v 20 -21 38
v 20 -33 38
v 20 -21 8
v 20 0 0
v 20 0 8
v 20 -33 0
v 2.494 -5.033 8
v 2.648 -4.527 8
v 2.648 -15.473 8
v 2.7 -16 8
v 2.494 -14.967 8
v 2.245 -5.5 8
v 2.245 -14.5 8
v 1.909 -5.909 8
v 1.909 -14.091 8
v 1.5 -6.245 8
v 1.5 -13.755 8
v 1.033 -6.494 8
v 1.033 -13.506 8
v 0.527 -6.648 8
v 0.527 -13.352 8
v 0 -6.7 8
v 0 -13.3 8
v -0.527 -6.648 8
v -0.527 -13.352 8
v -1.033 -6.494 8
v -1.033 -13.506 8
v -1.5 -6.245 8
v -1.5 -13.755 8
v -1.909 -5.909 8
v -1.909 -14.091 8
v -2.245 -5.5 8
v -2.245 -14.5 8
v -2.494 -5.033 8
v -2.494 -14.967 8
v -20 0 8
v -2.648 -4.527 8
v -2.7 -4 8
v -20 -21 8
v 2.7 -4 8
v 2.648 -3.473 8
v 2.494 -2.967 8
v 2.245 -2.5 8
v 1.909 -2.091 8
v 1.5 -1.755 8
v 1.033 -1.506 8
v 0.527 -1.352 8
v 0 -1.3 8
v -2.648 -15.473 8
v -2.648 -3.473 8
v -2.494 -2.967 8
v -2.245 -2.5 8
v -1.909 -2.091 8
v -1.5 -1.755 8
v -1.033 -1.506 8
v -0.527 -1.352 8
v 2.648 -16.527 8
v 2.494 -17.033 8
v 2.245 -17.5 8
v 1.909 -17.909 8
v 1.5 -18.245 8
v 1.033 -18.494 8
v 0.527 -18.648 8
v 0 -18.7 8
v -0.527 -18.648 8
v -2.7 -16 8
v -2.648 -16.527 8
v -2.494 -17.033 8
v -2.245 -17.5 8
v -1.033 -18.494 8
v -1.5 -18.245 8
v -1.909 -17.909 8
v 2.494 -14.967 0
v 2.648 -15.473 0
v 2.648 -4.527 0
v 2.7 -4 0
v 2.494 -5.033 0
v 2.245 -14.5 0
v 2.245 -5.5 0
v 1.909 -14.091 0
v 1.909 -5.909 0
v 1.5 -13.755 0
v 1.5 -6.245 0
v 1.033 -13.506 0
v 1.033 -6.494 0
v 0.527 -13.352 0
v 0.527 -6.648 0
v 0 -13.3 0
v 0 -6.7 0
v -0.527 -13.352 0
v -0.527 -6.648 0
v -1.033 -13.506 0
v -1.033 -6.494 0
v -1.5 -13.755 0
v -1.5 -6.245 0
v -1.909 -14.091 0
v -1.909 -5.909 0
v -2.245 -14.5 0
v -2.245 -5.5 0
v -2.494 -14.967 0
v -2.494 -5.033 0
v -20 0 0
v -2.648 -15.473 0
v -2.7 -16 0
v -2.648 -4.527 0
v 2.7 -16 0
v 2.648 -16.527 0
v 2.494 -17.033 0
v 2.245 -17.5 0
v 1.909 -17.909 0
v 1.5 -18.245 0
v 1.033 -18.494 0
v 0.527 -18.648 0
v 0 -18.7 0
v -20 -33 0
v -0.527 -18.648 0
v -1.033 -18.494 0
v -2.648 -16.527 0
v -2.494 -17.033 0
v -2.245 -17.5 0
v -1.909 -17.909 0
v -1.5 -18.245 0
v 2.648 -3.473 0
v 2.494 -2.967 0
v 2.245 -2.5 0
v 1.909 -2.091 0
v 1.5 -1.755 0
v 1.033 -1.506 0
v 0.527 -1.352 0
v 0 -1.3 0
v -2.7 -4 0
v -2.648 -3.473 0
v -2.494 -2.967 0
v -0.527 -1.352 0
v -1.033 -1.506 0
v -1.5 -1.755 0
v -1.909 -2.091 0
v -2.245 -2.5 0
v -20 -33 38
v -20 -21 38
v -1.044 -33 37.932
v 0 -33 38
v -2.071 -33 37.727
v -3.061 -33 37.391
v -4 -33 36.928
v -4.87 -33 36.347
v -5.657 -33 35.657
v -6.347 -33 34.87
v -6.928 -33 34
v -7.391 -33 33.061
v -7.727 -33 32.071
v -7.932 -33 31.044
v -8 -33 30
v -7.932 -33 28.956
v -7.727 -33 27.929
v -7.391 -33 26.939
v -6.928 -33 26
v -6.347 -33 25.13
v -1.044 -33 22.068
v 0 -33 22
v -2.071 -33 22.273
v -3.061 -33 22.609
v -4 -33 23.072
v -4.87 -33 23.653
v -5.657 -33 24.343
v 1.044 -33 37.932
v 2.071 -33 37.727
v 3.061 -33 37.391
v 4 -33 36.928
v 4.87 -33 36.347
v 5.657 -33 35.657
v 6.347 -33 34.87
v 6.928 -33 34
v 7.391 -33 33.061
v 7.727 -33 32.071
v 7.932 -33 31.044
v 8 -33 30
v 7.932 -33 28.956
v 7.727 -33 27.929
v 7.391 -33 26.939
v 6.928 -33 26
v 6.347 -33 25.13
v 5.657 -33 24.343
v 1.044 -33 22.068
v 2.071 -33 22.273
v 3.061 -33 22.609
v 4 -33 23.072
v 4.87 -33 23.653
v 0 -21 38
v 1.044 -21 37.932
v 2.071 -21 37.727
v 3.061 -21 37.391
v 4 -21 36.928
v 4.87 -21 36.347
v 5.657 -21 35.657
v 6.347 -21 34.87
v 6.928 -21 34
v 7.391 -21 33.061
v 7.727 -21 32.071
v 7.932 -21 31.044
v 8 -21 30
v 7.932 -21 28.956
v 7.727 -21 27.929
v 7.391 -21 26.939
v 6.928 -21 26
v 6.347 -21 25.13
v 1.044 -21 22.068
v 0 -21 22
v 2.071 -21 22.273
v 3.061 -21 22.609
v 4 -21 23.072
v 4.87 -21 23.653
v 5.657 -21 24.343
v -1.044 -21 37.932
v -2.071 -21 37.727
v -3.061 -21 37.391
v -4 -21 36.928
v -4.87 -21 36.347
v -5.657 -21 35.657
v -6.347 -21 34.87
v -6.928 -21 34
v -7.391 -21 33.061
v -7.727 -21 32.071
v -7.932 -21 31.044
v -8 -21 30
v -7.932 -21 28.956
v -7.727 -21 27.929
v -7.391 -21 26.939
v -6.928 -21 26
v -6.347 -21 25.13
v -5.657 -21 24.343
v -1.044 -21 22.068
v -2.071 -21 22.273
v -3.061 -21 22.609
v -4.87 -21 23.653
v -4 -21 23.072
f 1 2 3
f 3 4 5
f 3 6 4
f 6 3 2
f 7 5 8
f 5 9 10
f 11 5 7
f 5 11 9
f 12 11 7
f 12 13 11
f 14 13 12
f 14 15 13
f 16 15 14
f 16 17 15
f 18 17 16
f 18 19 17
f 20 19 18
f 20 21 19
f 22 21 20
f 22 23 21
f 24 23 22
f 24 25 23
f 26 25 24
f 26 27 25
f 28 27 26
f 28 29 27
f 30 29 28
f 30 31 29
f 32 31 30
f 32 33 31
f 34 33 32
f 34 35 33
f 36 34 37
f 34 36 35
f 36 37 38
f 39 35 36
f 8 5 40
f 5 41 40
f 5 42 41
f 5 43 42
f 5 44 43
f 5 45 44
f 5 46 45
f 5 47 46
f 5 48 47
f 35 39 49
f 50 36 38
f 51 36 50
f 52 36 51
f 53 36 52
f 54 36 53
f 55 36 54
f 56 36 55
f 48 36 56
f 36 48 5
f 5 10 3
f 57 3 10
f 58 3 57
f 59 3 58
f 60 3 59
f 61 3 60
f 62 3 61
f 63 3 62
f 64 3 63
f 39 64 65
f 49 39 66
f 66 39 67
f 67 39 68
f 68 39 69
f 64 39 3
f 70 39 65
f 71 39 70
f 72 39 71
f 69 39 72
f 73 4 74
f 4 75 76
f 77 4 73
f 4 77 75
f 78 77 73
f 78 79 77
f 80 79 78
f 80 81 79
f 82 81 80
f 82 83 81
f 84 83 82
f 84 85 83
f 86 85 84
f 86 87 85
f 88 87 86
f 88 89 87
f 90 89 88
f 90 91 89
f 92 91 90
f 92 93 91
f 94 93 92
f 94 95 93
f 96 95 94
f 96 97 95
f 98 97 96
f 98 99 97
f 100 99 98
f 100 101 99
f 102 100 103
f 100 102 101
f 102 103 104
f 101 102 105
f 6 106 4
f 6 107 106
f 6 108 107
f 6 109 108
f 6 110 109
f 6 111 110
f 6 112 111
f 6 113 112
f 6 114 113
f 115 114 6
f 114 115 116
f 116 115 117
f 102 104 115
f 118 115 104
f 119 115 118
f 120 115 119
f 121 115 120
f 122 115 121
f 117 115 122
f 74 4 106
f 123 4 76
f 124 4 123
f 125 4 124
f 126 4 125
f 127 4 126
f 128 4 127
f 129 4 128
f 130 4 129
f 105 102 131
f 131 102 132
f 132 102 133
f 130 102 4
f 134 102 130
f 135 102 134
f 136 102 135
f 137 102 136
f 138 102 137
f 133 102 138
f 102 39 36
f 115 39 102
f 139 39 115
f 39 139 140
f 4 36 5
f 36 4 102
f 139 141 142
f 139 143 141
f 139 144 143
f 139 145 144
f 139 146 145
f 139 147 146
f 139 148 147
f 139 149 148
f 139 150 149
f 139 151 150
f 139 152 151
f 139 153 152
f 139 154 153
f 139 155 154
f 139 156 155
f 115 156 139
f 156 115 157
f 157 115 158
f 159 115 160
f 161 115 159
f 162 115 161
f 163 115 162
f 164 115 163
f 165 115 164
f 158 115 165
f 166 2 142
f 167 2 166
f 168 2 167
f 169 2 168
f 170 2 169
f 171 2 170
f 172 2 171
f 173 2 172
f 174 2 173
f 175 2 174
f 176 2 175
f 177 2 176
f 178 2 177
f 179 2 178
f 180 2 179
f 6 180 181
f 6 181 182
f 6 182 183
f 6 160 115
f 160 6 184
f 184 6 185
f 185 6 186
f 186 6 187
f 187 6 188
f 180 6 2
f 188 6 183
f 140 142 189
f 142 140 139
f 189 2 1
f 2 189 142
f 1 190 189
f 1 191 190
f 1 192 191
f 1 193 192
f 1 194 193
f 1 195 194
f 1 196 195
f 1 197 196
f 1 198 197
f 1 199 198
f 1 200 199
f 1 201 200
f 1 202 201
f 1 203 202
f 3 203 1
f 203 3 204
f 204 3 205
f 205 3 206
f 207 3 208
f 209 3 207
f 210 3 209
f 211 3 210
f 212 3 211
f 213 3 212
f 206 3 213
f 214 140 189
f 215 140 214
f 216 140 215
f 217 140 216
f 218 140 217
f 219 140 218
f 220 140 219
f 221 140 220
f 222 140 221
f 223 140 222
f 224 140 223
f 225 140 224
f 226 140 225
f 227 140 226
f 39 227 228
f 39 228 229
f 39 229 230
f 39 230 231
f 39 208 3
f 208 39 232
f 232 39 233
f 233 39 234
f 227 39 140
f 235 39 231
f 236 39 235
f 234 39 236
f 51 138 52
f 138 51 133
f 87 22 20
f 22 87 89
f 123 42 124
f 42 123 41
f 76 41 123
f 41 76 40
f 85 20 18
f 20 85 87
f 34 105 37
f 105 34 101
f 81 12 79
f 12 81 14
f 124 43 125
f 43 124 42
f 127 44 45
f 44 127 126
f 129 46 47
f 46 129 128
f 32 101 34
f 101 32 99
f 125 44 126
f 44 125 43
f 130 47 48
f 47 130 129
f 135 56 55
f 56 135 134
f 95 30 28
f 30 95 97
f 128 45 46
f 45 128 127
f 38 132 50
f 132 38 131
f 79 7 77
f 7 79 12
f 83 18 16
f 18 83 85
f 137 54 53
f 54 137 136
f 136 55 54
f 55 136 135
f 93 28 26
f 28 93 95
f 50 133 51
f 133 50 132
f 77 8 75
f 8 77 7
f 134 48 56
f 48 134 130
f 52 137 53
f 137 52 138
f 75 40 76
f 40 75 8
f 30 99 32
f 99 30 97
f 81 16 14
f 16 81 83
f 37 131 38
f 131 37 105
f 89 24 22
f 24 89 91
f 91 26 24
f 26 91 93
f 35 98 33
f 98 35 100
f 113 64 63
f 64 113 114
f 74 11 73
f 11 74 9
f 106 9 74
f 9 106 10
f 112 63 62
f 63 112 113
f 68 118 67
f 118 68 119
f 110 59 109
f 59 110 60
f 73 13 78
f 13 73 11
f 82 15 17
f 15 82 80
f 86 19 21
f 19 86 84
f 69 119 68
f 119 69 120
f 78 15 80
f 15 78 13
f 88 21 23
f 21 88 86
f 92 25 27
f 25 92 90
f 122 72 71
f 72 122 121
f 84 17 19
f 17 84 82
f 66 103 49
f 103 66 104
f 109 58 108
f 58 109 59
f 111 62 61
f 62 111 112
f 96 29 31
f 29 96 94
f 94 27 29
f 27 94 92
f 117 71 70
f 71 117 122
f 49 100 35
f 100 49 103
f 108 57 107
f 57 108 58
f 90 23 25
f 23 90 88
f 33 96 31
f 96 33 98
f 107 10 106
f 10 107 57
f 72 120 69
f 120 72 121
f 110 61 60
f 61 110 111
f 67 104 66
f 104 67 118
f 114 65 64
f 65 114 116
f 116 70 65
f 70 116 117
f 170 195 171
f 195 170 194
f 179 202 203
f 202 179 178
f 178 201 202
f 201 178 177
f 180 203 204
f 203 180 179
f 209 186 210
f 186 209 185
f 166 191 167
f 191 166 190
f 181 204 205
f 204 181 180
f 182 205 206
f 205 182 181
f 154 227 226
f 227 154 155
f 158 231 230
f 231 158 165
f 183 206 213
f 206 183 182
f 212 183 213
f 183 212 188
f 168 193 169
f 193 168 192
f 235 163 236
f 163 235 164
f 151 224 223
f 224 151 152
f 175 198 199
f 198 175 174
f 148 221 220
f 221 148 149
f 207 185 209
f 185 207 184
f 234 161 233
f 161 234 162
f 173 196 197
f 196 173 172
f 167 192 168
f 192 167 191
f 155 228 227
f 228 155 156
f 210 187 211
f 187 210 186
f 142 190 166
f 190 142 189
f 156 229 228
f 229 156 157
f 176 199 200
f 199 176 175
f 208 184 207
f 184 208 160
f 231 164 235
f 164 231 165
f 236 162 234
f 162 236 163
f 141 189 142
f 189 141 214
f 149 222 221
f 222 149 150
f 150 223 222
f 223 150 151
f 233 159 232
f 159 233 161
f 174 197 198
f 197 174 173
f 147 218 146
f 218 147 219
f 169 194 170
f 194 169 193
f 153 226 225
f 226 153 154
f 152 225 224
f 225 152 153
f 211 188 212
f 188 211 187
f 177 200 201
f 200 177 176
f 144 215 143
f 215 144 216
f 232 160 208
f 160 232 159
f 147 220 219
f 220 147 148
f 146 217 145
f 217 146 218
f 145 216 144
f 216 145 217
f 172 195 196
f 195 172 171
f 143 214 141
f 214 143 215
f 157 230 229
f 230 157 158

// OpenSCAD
// =====================================================================
// child_lug.scad — 子機 吊り耳 (ボルトオン小部品、左右共通 ×2)
//
// 外装フレーム再設計 (R4/R8)。旧 child_shell_aft の一体吊り耳を分離した:
//   - 平置き印刷で層が荷重方向に並ぶ (一体型は +Z 印刷で層またぎになる)
//   - スーツケース輸送時は M5 ×2 を外して耳ごと外せる (R4 の解 c)
// コアフレームのラッチ/ヒンジ側フランジ頂部ボス (z=218 面、y -14..0、
// M5 熱圧入インサート ×2 @ x=±16(ボス中心相対), y=-6) へ垂直ボルトで締結。
// 機体では左右 x=±60 に配置。2 点ブライドル (Ø10 ロープ / M10 シャックル)。
//
// 座標系 (部品ローカル): 取付面 = z0 (機体では z=218)。x = 基線方向。
//   耳板は y -24..-12 (機体後方寄り)、シャックルピン軸 = Y。
// 印刷向き: 耳板面 (y=-24) をベッドへ倒して平置き。荷重・ボルト軸とも層面内。
// 荷重: L1 吊り 99 N/耳 (3g)・L2 輸送 600 N: lug 1.6 MPa / 耳板曲げ 18.8 MPa
//   (600N 側方単独ヒット、係数 10 込み) → PASS (quick_strength 済み)
// =====================================================================

/* [取付 (コアフレーム側と二重定義)]
   機体では x=±66 の縦列 2 本 (y=-4/-16)。列が 1 本なのは上ポケット壁 (r60.9)
   の外側に置くため。x=±66 は lf_x1=72 のフランジ内。 */
base_hw   = 20;     // 台座半幅 (x)
base_d    = 33;     // 台座奥行 (y 0..-33)
base_t    = 8;
m5_d      = 5.4;
bolt_y2   = [-4, -16];  // M5 ×2 (x=0 列)

/* [耳板] */
ear_t     = 12;     // 板厚 (y)。y -33..-21
ear_hw    = 20;     // 半幅 (x)
ear_top   = 38;     // 台座上面からの高さ (機体で z=256+... 実際は 218+8+30)
hole_d    = 16;     // Ø10 ロープ / M10 シャックル
hole_z    = 22;     // 台座上面から (機体 z = 248)

/* [Hidden] */
fudge = 0.01;

// ---- 検査 ------------------------------------------------------------
assert(ear_hw - hole_d/2 >= 10,               "耳の横端距離 < 10");
assert(base_t + ear_top - (base_t + hole_z) - hole_d/2 >= 8, "耳の上端距離 < 8");
assert(hole_z - hole_d/2 >= 6,                "穴と台座の距離 < 6");
assert(max(bolt_y2) + m5_d/2 <= -0.5, "M5 が台座前縁に近すぎる");
assert(min(bolt_y2) - 4.3 > -base_d + ear_t + 0.5,
       "M5 頭 (Ø8.5) が耳板に当たる");
echo(str("耳穴 中心 z(機体) = 218 + ", base_t + hole_z, " / 上端 = 218+", base_t + ear_top));

// ---- 形状 ------------------------------------------------------------
difference() {
    union() {
        // 台座
        translate([-base_hw, -base_d, 0]) cube([2*base_hw, base_d, base_t]);
        // 耳板
        translate([-ear_hw, -base_d, base_t - fudge])
            cube([2*ear_hw, ear_t, ear_top - base_t + fudge]);
    }
    // M5 ×2 (垂直、x=0 の縦列)
    for (yy = bolt_y2)
        translate([0, yy, -fudge])
            cylinder(d = m5_d, h = base_t + 2*fudge, $fn = 32);
    // シャックル穴 Ø16 (軸 Y)
    translate([0, -base_d - fudge, base_t + hole_z])
        rotate([-90, 0, 0]) cylinder(d = hole_d, h = ear_t + 2*fudge, $fn = 48);
}
